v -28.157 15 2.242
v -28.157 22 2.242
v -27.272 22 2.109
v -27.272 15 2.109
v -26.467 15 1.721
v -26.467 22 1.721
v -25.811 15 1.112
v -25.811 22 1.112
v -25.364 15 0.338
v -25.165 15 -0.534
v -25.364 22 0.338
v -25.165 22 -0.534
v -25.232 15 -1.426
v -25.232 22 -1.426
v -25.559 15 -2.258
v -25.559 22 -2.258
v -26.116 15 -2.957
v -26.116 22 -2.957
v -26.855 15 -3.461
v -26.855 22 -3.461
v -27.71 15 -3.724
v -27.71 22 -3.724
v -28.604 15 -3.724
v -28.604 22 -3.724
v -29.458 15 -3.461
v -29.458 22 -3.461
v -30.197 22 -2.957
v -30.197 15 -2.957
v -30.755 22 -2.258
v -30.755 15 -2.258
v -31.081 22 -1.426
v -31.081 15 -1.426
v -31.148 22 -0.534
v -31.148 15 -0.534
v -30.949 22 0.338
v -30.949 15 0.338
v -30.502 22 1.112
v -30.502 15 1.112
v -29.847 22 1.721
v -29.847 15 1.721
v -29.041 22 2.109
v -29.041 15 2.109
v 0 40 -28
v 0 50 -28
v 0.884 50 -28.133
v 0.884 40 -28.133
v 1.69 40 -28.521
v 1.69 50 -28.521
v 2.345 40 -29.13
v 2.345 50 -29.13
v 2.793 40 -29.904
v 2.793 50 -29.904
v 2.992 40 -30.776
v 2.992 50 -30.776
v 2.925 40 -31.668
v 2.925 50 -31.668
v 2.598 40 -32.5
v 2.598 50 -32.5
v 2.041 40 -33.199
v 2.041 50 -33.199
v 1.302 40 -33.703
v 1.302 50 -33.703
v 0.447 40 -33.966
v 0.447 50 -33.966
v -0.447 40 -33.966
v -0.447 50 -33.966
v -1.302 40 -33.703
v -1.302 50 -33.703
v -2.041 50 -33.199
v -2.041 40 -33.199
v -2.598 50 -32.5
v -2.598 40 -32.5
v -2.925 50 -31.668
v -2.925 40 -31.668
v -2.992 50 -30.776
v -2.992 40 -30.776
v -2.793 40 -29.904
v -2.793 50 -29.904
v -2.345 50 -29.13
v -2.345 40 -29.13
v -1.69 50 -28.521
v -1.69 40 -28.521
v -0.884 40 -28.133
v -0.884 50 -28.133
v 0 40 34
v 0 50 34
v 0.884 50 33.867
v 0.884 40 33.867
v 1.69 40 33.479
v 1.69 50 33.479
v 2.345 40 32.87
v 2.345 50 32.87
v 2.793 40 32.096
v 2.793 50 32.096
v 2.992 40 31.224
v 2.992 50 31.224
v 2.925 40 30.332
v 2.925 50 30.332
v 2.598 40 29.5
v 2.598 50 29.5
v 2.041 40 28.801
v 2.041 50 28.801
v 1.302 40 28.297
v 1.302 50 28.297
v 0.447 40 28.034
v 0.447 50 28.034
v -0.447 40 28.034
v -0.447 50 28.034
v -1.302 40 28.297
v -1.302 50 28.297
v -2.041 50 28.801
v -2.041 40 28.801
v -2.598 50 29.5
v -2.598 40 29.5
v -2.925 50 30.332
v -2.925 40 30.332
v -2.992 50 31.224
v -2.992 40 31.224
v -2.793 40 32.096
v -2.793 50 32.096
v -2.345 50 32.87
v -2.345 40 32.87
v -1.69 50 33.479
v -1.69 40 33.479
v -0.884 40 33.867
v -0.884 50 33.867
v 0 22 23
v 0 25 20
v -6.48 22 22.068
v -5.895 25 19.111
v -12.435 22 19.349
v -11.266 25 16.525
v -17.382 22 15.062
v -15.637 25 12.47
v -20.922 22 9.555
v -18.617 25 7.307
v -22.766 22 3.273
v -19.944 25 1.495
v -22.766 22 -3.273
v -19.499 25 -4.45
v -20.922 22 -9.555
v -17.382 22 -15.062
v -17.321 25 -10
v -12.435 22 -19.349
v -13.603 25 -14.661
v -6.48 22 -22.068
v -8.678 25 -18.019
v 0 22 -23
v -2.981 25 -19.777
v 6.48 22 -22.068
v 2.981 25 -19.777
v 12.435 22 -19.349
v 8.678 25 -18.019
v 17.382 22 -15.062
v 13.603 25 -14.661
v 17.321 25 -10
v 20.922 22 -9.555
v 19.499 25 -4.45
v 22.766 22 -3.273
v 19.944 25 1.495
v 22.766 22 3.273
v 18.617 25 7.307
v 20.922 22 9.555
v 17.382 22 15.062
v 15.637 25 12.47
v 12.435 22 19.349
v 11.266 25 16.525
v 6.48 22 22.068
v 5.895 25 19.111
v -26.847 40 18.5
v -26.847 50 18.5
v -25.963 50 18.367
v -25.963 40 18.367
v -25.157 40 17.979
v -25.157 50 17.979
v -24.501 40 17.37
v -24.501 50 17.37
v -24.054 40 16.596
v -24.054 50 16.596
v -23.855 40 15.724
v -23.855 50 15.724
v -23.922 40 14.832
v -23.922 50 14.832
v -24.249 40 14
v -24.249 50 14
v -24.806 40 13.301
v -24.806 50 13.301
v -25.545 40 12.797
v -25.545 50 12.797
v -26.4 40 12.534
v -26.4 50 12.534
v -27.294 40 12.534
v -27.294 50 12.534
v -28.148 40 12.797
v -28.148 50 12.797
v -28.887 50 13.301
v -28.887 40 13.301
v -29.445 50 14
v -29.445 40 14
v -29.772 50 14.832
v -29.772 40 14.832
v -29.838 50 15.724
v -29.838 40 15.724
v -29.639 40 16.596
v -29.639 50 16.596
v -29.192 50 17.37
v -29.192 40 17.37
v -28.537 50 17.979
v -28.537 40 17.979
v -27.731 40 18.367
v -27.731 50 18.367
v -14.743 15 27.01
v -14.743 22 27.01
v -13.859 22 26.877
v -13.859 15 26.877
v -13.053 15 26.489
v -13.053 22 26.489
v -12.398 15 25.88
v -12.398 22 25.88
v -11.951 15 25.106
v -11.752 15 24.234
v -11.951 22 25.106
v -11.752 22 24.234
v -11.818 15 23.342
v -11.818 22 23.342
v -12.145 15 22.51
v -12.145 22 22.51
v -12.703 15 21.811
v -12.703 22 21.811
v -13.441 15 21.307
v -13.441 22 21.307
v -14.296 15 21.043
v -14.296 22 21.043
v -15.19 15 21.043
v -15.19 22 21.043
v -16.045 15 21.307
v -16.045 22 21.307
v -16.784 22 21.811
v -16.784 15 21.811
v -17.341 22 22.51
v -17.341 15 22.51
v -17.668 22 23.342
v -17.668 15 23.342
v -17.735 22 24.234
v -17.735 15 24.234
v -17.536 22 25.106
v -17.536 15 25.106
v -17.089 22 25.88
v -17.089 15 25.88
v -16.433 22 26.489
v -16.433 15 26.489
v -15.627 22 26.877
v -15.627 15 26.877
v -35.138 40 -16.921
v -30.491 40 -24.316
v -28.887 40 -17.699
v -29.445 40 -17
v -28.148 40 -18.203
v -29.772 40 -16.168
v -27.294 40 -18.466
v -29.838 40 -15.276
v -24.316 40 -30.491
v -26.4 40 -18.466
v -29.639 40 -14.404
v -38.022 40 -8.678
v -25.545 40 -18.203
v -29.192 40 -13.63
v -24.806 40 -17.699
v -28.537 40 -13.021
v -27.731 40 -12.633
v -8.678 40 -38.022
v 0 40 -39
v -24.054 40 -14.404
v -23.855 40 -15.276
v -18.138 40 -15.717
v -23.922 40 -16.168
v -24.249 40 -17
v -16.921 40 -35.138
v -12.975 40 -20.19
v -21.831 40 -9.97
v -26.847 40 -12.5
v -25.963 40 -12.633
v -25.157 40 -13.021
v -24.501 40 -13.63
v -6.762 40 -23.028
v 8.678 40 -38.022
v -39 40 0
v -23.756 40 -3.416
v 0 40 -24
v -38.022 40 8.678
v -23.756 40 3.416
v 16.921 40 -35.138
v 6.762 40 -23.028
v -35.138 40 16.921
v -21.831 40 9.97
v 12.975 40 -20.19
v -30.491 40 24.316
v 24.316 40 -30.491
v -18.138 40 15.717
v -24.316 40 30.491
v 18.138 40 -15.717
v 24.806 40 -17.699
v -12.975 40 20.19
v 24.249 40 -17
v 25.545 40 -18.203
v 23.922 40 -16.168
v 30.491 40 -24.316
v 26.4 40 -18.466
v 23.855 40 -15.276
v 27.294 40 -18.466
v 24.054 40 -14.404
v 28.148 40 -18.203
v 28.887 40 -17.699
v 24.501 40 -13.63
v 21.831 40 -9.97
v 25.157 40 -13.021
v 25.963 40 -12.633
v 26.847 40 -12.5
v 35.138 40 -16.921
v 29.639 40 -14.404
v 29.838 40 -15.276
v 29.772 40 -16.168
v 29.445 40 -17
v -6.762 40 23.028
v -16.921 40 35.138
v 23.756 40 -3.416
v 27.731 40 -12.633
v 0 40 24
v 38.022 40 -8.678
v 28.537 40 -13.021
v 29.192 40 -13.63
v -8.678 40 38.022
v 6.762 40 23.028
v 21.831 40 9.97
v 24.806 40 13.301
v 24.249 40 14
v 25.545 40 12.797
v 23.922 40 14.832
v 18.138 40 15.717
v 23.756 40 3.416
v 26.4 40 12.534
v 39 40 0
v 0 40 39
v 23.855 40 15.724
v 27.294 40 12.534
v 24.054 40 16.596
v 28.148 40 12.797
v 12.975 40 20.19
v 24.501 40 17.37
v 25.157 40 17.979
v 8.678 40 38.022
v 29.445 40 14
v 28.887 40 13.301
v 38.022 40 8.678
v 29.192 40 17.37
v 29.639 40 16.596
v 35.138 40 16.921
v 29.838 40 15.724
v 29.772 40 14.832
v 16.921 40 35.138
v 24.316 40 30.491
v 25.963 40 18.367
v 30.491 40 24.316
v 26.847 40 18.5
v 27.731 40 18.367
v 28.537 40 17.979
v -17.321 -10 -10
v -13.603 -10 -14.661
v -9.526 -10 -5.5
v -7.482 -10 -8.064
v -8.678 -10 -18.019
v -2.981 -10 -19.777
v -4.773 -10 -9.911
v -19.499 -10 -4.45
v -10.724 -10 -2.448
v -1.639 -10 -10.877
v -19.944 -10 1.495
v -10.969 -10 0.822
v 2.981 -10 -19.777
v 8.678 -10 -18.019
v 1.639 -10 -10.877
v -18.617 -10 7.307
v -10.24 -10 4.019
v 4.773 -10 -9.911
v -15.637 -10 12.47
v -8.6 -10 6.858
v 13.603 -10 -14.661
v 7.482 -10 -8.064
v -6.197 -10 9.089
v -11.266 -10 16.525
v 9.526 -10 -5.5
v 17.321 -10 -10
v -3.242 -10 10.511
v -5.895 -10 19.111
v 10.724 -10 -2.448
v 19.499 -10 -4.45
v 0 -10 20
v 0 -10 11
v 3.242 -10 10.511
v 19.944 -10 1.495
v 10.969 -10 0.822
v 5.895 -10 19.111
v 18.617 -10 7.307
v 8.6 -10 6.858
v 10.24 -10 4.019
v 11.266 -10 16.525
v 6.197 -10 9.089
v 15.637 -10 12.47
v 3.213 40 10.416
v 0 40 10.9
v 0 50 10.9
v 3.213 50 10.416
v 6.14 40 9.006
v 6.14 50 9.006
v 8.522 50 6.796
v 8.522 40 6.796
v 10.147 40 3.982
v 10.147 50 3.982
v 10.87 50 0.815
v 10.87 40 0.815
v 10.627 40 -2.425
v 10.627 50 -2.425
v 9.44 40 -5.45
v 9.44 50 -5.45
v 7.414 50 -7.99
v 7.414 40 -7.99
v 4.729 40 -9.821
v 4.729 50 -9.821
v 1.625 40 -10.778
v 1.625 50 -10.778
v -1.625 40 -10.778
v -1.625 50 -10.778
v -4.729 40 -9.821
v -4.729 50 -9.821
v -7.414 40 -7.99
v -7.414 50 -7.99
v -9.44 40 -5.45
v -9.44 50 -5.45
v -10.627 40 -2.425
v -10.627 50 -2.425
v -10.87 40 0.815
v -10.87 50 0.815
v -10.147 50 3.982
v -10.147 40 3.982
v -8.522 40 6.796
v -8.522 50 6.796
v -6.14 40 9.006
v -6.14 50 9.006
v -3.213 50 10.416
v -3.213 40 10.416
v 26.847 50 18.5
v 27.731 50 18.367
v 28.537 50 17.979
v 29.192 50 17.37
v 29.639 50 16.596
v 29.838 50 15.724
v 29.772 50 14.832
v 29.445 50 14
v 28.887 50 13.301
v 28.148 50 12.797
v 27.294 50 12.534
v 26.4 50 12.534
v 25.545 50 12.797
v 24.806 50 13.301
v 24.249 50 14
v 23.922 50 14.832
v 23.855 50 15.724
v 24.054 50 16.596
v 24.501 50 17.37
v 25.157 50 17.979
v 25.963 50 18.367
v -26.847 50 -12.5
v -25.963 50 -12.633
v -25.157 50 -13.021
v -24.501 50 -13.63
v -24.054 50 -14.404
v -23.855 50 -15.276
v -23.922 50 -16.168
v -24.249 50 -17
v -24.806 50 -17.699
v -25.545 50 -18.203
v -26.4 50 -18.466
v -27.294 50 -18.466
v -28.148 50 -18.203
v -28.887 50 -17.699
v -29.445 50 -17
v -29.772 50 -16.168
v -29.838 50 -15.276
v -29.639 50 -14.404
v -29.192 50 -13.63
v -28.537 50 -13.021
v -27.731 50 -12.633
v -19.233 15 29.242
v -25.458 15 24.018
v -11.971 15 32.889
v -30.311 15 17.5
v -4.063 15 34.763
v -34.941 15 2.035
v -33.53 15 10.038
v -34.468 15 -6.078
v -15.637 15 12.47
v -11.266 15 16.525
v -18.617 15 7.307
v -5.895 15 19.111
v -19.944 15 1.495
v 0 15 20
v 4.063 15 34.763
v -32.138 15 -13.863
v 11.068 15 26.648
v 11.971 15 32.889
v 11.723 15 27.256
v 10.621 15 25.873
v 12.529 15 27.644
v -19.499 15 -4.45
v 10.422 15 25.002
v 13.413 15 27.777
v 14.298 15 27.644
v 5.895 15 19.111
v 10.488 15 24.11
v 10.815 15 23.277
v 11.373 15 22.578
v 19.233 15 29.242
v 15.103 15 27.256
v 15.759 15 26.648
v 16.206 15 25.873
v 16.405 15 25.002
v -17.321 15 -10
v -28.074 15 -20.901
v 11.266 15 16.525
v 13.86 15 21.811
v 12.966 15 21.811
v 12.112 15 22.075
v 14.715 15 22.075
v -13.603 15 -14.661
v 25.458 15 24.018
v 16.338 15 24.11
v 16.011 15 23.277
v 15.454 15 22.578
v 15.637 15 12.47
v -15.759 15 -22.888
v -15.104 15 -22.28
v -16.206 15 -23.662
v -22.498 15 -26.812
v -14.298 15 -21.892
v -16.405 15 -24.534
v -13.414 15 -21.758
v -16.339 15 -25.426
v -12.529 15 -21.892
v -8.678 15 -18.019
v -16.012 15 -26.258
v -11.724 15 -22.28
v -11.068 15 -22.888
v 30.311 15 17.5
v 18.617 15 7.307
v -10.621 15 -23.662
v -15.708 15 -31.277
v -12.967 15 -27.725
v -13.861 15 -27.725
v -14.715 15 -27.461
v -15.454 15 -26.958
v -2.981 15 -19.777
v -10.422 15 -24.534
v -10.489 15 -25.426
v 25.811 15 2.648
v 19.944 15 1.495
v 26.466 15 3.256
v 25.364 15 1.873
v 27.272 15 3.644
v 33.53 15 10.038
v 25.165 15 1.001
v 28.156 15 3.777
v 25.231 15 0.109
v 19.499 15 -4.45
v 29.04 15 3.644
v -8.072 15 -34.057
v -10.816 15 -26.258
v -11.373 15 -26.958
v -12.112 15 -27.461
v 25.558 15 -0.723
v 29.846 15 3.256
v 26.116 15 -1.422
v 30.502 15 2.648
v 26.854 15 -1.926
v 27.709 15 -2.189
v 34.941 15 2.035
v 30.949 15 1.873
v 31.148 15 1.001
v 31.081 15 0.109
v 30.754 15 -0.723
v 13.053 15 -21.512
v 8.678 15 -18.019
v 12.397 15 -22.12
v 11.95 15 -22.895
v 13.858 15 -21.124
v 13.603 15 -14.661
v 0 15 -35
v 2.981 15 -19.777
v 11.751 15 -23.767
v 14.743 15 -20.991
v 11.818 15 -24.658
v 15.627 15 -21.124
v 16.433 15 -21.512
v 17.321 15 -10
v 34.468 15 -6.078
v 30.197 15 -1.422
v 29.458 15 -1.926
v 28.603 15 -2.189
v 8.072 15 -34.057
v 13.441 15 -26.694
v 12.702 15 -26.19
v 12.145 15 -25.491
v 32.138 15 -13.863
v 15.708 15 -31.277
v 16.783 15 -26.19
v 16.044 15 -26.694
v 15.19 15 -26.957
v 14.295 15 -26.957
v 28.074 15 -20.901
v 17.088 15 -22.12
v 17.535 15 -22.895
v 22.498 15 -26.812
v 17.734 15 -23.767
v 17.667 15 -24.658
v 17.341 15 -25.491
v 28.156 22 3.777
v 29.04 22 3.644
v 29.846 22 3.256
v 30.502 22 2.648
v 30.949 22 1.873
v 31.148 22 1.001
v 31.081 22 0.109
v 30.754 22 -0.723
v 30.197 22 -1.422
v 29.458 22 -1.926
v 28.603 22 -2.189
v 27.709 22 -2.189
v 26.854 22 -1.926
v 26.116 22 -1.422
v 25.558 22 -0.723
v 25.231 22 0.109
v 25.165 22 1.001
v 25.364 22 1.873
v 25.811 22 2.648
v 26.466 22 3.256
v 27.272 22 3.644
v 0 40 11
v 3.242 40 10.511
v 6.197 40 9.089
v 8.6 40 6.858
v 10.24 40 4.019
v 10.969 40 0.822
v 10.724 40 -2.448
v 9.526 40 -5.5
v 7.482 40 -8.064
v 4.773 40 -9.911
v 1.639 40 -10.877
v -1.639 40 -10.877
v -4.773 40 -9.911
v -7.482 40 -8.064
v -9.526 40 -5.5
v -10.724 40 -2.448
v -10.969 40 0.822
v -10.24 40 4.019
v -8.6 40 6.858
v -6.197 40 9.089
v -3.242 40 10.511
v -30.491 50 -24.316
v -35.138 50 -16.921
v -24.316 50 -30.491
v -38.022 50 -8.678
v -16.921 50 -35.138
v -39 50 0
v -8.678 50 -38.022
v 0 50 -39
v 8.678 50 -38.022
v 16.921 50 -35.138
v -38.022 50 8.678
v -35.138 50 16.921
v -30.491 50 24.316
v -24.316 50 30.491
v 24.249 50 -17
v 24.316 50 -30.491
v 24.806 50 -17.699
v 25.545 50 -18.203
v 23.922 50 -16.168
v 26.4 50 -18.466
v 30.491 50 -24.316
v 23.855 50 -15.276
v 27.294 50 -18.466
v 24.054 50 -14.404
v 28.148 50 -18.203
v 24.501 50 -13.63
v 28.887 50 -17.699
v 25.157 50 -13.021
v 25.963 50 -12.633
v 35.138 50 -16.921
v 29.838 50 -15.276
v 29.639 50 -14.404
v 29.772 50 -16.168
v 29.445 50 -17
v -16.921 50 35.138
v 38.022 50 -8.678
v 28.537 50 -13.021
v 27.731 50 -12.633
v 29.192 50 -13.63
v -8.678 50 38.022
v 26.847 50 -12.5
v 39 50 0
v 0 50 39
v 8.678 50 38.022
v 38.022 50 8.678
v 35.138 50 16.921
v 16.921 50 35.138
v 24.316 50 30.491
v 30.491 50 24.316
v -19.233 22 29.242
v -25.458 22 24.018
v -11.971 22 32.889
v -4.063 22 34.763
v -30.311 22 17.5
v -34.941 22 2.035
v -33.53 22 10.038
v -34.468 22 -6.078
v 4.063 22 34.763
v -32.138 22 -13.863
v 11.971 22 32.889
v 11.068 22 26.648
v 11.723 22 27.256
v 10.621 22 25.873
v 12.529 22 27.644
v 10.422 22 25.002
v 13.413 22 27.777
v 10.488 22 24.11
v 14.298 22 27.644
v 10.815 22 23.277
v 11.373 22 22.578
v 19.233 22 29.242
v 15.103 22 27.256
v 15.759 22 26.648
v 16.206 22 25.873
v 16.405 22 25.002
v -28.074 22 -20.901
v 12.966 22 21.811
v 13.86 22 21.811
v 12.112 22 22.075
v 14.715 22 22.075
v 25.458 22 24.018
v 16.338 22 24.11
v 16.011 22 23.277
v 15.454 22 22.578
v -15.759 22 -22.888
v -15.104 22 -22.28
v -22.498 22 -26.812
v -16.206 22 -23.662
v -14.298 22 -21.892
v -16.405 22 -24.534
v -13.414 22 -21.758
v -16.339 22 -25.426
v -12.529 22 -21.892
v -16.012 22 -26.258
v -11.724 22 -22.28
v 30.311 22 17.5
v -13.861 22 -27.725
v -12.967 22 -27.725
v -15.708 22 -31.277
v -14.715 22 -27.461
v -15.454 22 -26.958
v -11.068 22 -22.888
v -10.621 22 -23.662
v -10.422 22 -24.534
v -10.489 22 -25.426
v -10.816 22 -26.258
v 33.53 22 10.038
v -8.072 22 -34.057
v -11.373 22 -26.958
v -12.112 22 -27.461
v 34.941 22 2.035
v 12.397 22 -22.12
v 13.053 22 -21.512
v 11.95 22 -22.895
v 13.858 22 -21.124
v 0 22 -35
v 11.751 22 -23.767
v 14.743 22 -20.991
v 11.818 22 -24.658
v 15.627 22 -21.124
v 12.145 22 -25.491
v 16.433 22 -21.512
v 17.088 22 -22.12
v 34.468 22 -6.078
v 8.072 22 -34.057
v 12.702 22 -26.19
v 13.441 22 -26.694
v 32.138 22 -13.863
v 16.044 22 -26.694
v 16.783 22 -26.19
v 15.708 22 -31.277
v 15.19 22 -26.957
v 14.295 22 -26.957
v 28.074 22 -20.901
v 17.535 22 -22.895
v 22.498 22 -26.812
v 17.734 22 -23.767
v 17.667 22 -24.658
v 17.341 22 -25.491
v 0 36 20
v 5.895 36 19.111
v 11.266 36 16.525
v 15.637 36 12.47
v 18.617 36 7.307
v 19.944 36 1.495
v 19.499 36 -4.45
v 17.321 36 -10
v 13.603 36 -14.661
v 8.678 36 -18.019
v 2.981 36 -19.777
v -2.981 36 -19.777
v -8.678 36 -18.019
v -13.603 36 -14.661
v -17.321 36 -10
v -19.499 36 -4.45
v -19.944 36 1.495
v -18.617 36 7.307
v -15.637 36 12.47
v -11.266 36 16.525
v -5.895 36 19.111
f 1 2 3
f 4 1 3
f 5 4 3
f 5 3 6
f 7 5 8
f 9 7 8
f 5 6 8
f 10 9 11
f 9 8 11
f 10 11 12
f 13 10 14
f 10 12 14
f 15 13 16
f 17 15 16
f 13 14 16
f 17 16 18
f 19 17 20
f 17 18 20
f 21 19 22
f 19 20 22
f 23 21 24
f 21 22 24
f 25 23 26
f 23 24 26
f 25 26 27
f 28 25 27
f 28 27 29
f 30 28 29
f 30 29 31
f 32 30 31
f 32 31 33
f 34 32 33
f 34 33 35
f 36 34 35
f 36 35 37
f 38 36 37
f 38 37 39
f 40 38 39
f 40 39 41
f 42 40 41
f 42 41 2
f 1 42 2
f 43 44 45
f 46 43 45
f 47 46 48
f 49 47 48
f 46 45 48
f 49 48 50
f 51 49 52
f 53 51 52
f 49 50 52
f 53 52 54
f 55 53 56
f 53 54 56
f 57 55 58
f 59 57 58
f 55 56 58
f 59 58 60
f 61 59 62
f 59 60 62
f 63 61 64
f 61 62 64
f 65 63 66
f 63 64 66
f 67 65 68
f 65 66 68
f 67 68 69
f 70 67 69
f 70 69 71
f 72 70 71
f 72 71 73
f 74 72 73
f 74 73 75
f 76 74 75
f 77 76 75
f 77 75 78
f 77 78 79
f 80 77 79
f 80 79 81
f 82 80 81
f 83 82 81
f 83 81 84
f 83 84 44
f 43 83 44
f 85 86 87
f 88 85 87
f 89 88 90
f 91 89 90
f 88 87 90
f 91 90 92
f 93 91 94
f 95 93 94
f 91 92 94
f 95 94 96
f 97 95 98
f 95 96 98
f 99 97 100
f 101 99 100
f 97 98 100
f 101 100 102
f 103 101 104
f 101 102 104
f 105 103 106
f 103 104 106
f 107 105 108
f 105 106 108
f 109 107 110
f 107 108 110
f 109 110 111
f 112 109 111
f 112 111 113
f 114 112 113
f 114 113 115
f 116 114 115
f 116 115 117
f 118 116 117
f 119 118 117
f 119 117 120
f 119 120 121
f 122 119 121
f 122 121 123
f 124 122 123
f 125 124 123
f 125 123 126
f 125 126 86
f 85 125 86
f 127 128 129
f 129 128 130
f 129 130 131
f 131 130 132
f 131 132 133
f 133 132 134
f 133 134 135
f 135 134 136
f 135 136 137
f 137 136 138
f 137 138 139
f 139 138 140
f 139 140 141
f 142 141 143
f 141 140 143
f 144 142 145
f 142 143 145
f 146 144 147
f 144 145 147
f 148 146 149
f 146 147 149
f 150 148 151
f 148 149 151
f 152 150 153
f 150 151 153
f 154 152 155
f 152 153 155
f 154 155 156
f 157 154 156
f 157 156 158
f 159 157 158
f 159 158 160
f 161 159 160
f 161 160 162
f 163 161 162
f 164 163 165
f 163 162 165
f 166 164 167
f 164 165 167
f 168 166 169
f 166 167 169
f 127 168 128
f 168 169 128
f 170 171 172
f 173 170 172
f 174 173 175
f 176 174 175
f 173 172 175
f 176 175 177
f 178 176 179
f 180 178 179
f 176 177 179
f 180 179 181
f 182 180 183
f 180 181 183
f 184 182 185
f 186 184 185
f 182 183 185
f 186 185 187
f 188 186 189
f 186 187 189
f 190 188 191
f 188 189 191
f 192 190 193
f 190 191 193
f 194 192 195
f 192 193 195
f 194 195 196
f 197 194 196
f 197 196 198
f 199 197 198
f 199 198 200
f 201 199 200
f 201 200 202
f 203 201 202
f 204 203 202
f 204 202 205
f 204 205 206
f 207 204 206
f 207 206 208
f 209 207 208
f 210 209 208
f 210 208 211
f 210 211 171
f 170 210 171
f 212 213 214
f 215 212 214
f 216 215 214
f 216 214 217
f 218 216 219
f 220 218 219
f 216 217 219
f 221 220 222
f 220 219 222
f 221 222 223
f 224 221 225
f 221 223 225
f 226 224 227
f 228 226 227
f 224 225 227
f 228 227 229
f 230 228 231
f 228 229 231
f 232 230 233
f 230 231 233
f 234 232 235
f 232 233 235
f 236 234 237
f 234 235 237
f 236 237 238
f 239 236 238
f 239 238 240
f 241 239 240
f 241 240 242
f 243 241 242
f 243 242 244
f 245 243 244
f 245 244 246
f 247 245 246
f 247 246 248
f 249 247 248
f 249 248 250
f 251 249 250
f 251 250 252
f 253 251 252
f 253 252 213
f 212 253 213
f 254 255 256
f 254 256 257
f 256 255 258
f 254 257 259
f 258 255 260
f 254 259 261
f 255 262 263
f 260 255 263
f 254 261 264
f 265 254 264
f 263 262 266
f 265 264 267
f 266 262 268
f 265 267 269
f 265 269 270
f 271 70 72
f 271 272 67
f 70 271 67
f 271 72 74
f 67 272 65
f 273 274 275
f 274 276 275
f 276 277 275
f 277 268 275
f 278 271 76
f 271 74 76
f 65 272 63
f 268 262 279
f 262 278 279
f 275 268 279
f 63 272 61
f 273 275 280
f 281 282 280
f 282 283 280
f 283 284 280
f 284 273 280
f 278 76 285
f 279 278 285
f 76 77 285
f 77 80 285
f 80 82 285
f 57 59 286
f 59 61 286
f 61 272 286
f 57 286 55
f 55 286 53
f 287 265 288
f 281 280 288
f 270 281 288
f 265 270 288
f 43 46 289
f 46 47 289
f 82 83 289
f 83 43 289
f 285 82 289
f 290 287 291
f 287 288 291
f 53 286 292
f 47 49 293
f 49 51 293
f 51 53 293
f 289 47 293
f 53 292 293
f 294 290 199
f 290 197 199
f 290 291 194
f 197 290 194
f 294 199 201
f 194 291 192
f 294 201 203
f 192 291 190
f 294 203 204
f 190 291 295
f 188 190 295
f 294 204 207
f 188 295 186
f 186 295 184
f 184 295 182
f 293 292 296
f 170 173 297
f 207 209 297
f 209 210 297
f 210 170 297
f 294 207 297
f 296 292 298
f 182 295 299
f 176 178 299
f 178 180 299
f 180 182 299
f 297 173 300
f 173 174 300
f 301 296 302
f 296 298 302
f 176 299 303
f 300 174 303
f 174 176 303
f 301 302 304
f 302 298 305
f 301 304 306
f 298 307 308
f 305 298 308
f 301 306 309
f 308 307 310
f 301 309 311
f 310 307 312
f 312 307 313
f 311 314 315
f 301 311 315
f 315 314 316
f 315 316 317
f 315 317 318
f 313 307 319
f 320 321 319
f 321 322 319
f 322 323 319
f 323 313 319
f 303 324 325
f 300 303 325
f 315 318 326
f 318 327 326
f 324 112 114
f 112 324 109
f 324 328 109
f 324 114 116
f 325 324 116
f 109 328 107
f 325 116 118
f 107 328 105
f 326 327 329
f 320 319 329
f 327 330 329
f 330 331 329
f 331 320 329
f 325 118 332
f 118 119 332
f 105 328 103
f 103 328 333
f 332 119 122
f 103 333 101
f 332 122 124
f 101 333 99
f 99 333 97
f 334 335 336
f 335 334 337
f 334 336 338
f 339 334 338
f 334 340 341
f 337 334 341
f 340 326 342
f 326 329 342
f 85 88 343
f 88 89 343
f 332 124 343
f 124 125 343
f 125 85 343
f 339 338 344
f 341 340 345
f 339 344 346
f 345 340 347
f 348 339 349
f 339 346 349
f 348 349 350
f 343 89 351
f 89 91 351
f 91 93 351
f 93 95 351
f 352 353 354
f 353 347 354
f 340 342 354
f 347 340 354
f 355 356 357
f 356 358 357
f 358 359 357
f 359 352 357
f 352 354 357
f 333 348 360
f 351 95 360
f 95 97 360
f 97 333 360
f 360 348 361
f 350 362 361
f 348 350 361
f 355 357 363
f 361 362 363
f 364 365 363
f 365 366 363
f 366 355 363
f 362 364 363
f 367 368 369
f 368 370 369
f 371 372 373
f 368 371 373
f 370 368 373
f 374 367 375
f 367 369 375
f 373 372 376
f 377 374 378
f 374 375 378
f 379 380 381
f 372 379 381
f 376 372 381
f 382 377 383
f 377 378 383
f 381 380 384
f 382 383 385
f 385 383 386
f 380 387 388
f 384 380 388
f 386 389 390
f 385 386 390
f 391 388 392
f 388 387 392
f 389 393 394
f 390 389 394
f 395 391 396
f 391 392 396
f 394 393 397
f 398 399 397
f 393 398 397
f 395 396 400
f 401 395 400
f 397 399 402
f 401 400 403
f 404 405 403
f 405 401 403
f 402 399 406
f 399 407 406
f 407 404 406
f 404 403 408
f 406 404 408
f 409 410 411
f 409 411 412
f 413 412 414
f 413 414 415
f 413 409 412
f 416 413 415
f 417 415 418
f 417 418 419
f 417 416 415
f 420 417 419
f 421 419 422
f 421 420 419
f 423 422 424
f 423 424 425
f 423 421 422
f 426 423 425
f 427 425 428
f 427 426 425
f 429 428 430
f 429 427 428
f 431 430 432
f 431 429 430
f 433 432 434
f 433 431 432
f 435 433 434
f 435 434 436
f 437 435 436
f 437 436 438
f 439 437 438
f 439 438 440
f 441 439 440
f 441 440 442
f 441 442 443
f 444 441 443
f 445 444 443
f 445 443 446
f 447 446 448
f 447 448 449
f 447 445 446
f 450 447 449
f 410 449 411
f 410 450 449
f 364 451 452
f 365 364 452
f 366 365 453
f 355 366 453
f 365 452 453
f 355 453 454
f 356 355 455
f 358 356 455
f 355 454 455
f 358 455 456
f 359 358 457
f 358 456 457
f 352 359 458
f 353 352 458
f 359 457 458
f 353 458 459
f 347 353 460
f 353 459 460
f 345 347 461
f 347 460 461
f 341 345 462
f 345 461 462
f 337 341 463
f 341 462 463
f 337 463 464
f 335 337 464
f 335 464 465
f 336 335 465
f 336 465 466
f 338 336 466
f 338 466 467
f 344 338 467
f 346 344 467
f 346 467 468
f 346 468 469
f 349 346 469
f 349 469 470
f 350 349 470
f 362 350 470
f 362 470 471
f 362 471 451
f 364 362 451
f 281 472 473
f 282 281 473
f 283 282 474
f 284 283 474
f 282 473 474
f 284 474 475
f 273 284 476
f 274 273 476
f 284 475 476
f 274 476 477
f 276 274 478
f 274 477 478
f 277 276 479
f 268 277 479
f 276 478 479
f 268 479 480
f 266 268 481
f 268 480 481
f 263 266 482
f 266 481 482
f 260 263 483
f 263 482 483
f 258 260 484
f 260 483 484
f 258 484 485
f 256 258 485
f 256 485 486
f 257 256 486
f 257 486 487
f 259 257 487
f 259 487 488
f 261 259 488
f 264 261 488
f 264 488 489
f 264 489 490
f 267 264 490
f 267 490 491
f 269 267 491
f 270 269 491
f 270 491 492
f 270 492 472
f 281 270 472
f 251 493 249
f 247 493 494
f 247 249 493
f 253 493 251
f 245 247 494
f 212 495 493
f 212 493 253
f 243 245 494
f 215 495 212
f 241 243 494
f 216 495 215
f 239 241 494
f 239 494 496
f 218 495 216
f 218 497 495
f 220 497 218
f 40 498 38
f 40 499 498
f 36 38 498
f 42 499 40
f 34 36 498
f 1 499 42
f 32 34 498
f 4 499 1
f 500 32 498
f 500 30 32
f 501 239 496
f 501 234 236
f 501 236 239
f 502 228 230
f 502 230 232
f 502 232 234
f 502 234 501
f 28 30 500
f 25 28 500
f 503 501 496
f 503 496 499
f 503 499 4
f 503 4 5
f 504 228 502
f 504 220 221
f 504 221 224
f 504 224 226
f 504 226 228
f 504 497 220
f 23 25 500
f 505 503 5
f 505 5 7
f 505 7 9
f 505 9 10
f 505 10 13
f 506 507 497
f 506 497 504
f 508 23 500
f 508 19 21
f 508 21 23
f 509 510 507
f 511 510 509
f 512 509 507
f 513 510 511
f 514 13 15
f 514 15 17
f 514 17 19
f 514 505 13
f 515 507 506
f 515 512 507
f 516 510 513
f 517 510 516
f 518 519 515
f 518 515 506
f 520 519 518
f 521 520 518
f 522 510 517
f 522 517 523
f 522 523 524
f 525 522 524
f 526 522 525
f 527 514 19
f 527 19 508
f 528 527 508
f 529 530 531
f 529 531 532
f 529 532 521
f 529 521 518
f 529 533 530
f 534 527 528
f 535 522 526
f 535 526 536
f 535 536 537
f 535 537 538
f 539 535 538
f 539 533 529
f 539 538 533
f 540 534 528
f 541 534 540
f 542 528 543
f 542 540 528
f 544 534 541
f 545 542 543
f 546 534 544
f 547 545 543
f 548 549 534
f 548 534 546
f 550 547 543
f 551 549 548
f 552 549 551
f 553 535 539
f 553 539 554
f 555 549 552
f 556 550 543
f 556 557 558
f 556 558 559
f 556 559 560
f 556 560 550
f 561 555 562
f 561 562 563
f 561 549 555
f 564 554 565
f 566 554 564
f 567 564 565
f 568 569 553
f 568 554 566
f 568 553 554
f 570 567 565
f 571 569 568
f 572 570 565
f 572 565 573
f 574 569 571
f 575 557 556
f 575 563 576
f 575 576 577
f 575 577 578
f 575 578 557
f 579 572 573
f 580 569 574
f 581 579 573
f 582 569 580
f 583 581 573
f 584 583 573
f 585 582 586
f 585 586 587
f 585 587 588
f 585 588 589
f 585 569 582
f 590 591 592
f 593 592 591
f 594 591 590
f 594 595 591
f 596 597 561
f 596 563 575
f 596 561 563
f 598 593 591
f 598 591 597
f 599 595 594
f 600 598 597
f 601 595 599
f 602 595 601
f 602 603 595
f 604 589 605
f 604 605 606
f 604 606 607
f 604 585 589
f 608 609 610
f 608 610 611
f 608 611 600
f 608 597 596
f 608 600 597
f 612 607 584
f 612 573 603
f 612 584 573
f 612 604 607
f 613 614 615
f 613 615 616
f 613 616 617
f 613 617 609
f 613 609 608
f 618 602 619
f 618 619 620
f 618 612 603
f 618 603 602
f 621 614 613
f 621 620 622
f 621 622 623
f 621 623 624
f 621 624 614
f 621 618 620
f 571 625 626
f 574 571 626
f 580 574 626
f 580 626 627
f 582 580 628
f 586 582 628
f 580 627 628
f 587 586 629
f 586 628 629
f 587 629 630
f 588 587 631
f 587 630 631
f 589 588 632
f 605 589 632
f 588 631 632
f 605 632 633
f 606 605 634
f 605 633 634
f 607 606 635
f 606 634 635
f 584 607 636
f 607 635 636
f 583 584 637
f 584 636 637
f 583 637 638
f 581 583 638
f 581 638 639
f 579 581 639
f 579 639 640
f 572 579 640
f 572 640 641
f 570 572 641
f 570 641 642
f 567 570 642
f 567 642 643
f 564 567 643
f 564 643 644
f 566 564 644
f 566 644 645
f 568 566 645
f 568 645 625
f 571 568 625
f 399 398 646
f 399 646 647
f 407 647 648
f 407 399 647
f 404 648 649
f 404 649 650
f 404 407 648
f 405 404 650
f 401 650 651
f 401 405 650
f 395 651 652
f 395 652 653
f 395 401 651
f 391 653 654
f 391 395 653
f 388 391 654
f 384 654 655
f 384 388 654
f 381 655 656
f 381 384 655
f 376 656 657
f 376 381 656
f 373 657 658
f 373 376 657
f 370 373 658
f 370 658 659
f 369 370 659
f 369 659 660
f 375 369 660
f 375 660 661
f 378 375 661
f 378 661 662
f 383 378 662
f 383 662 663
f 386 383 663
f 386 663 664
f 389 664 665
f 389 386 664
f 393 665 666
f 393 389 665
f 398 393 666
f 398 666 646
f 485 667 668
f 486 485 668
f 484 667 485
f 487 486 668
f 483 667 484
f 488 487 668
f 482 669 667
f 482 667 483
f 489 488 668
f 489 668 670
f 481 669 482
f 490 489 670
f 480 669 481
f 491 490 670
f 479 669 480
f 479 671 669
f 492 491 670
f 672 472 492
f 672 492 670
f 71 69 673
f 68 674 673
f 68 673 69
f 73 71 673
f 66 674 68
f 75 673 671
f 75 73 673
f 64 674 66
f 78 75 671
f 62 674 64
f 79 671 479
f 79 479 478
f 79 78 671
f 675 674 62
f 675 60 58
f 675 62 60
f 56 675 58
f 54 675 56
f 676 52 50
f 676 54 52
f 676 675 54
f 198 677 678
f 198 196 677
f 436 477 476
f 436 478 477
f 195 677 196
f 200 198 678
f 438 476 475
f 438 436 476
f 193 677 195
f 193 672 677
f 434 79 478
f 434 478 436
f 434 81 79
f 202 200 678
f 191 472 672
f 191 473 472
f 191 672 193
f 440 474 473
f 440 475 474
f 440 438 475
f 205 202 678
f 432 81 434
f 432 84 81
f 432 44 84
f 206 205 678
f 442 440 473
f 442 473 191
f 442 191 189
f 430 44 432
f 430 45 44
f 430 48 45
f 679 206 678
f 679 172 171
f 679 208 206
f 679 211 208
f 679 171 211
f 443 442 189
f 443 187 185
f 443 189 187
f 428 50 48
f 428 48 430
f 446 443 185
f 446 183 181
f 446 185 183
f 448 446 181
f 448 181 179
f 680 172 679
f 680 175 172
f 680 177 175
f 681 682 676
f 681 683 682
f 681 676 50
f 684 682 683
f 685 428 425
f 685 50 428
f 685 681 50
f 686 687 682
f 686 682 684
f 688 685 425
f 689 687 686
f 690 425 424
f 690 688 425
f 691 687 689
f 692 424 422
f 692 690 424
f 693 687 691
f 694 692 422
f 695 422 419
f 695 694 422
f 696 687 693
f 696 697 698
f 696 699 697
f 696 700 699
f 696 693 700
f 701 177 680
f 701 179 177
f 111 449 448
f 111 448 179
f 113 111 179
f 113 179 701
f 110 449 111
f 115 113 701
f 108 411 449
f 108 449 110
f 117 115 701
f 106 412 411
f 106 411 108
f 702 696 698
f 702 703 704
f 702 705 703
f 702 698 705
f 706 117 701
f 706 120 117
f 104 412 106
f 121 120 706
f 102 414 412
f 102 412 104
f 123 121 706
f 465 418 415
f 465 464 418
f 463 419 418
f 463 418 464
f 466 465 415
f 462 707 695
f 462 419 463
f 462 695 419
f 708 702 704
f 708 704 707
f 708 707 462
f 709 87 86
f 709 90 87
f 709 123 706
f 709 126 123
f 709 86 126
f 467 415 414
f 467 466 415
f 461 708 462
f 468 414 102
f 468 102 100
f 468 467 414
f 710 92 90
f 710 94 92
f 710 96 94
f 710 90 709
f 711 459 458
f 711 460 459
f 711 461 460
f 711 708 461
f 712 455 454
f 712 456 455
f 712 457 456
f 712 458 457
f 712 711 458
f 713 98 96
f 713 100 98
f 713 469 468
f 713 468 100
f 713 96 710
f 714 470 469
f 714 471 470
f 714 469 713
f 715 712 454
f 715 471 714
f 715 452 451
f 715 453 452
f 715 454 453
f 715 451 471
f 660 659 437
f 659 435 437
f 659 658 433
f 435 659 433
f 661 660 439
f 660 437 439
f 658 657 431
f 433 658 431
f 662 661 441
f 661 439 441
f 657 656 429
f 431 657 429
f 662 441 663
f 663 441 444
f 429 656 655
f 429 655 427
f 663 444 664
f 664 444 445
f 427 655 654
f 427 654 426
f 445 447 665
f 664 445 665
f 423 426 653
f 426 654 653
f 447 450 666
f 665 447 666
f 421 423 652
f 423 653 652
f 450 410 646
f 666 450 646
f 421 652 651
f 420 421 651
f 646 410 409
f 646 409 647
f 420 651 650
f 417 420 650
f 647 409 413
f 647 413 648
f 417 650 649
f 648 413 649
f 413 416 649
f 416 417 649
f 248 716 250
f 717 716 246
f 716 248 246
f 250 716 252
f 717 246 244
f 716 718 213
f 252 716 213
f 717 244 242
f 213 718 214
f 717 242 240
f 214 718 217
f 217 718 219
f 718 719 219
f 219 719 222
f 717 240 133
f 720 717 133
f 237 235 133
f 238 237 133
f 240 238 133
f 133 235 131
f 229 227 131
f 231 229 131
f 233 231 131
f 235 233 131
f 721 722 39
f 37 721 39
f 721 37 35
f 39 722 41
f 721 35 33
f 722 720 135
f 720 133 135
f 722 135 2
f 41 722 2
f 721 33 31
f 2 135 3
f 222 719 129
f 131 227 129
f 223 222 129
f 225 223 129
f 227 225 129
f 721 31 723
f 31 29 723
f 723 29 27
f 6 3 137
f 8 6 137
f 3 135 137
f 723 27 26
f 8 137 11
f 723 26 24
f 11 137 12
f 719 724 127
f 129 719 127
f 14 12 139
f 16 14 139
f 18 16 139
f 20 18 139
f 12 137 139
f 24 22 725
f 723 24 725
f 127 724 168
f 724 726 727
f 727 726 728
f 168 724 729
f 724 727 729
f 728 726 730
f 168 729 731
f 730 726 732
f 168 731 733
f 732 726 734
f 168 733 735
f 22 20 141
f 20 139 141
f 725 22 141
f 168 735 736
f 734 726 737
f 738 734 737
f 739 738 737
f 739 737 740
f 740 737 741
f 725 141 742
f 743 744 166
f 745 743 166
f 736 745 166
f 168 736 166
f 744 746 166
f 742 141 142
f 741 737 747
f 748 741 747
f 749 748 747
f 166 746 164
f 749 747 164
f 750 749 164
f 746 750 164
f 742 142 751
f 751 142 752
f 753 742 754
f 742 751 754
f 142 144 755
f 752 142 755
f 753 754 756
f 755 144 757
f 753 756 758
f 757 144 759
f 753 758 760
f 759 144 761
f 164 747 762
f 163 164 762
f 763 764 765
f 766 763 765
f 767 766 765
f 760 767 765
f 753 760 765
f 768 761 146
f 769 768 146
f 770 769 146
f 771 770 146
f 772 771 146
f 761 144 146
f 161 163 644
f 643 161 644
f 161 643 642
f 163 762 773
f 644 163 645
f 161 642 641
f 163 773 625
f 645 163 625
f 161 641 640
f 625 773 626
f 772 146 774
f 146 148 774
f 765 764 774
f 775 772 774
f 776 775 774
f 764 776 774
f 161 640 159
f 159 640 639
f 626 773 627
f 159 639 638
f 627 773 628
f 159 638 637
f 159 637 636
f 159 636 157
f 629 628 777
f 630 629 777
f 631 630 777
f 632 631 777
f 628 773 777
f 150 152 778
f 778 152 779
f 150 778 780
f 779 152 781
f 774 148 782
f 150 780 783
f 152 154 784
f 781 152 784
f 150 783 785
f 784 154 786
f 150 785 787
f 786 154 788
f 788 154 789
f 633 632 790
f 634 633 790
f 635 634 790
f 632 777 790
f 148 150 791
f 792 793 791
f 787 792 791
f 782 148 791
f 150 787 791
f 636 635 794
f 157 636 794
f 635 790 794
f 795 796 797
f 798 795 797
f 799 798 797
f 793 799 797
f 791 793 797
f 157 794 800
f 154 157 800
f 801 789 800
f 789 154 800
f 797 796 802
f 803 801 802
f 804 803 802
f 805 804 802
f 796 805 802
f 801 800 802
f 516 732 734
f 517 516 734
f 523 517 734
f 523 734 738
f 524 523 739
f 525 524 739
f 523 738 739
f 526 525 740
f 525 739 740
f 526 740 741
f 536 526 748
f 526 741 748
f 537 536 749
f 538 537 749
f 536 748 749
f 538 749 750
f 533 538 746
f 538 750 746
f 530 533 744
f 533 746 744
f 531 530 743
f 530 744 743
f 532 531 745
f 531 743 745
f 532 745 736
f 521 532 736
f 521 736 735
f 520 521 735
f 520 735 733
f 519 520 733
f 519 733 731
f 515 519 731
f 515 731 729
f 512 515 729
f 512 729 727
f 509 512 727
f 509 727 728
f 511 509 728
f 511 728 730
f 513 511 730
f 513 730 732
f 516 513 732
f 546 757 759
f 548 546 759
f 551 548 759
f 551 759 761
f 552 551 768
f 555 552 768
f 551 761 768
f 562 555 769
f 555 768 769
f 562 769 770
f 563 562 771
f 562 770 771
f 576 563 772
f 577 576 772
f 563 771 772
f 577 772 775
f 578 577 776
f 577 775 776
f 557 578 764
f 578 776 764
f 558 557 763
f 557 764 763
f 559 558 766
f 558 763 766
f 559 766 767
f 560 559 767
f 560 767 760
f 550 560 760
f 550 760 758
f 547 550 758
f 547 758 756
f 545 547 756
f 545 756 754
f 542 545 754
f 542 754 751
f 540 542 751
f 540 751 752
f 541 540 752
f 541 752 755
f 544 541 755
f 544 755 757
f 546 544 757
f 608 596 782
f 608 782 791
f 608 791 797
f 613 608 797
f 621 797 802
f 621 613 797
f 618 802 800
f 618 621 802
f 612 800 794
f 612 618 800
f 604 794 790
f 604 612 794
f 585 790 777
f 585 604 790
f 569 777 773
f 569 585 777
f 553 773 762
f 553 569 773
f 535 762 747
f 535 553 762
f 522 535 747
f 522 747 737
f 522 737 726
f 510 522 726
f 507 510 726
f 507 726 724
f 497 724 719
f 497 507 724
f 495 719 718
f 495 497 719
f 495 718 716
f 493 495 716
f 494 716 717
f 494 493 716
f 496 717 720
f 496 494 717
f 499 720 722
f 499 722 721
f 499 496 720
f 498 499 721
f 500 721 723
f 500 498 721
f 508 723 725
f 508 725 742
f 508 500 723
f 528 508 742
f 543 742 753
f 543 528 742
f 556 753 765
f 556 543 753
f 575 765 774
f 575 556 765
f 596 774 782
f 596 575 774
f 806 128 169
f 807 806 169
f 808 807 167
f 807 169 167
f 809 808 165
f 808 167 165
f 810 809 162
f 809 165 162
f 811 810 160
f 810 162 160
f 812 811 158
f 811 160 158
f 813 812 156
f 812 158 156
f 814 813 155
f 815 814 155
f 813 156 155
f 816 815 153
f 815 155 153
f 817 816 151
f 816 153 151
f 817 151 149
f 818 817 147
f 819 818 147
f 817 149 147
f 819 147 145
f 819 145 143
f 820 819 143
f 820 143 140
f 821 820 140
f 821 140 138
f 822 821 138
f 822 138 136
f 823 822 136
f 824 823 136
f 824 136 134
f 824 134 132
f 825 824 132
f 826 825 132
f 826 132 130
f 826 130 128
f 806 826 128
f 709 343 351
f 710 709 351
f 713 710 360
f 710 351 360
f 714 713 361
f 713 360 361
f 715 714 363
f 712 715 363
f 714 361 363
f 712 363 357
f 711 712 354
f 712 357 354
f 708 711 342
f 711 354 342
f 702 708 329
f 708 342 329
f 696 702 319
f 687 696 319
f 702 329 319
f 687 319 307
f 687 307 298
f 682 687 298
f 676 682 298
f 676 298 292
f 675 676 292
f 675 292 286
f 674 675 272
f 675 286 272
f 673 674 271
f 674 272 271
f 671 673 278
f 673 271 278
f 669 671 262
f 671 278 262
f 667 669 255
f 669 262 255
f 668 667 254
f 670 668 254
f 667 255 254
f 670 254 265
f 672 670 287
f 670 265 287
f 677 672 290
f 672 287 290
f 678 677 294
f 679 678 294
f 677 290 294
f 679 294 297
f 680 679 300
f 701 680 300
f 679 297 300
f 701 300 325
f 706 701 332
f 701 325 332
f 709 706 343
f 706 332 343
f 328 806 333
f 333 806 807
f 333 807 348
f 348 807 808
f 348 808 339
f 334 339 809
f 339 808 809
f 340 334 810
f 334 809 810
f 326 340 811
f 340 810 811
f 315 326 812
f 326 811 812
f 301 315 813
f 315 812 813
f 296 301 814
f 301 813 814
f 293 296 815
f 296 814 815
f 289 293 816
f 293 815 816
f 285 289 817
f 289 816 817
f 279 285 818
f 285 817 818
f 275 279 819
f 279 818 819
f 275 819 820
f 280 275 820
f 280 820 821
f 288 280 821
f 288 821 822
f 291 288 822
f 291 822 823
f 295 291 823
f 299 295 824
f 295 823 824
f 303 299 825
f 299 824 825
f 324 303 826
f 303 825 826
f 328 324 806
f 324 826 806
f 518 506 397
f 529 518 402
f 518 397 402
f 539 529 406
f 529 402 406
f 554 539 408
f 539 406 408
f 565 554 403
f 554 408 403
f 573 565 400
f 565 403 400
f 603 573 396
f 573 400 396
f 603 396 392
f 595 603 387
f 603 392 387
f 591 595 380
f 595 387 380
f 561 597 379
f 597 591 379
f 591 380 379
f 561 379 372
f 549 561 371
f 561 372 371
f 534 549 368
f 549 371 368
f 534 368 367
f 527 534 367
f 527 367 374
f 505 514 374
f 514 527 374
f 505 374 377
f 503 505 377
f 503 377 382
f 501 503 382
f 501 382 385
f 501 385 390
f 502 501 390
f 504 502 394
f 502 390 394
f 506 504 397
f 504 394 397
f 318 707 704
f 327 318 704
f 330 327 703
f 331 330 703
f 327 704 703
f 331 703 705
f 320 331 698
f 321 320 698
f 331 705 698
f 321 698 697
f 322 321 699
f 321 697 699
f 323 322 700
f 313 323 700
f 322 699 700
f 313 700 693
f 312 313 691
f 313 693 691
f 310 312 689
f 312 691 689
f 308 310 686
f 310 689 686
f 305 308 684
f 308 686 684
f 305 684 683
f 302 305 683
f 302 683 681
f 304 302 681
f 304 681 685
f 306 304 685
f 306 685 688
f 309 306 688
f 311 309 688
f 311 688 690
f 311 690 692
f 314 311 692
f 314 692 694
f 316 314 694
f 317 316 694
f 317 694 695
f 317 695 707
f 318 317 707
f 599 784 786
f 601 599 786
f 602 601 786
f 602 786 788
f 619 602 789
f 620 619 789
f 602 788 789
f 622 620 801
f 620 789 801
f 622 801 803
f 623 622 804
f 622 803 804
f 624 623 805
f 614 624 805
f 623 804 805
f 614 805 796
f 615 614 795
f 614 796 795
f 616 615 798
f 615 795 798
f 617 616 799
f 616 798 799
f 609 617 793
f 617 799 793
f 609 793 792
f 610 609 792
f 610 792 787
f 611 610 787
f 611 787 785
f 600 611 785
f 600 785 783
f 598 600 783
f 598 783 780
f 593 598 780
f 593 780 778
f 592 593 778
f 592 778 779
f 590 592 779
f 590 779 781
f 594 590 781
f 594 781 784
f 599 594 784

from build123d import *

# Parameters (mm, degrees)
EXTRUDE_START       = -10
SKETCH_1_R          = 20
SKETCH_1_R_2        = 11
EXTRUDE_1_DEPTH     = 50
SKETCH_2_R          = 39
SKETCH_2_R_2        = 10.9
EXTRUDE_2_DEPTH     = 10
CHAMFER_1_SIZE      = 4
SKETCH_3_R          = 35
SKETCH_3_R_2        = 17
EXTRUDE_3_DEPTH     = 7
CHAMFER_2_SIZE      = 3
SKETCH_4_R          = 3.000000009
CUT_EXTRUDE_1_DEPTH = 64.765194268
CUT_EXTRUDE_4_REACH = 83.498
SKETCH_5_R          = 3


with BuildPart() as part:
    # Эскиз1 → Вытянуть1 (new body)
    with BuildSketch(Plane(origin=(0, 0, 0), x_dir=(1, 0, 0), z_dir=(0, 1, 0)).offset(EXTRUDE_START)):
        with Locations(Location((0, 0, 0), (0, 0, 270))):
            Circle(SKETCH_1_R)
        with Locations(Location((0, 0, 0), (0, 0, 270))):
            Circle(SKETCH_1_R_2, mode=Mode.SUBTRACT)
    extrude(amount=EXTRUDE_1_DEPTH)

    # Эскиз2 → Вытянуть2 (add)
    with BuildSketch(Plane(origin=(0, 40, 0), x_dir=(1, 0, 0), z_dir=(0, 1, 0))):
        with Locations(Location((0, 0, 0), (0, 0, 270))):
            Circle(SKETCH_2_R)
        with Locations(Location((0, 0, 0), (0, 0, 270))):
            Circle(SKETCH_2_R_2, mode=Mode.SUBTRACT)
    extrude(amount=EXTRUDE_2_DEPTH)

    # Фаска1
    chamfer_1_edges = [part.edges().sort_by_distance(p)[0] for p in [
        (0, 40, -20),
    ]]
    chamfer(chamfer_1_edges, length=CHAMFER_1_SIZE)

    # Эскиз3 → Вытянуть3 (add)
    with BuildSketch(Plane.XZ.offset(-15)):
        with Locations(Location((0, 0, 0), (0, 0, 270))):
            Circle(SKETCH_3_R)
        Circle(SKETCH_3_R_2, mode=Mode.SUBTRACT)
    extrude(amount=-EXTRUDE_3_DEPTH)

    # Фаска2
    chamfer_2_edges = [part.edges().sort_by_distance(p)[0] for p in [
        (0, 22, -20),
    ]]
    chamfer(chamfer_2_edges, length=CHAMFER_2_SIZE)

    # Эскиз4 → Вырез-Вытянуть1 (cut, through all)
    with BuildSketch(Plane(origin=(0, 22, 0), x_dir=(1, 0, 0), z_dir=(0, 1, 0))):
        with Locations(Location((-13.413764566, 24.758384407, 0), (0, 0, 270))):
            Circle(SKETCH_4_R)
        with Locations(Location((14.742626006, 23.99086611, 0), (0, 0, 270))):
            Circle(SKETCH_4_R)
        with Locations(Location((28.156130949, -0.777042552, 0), (0, 0, 270))):
            Circle(SKETCH_4_R)
        with Locations(Location((13.41324532, -24.777432917, 0), (0, 0, 270))):
            Circle(SKETCH_4_R)
        with Locations(Location((-14.743145251, -24.009914621, 0), (0, 0, 270))):
            Circle(SKETCH_4_R)
        with Locations(Location((-28.156650194, 0.757994041, 0), (0, 0, 270))):
            Circle(SKETCH_4_R)
    extrude(amount=-CUT_EXTRUDE_1_DEPTH, mode=Mode.SUBTRACT)

    # Эскиз5 → Вытянуть4 (cut, up to next)
    with BuildSketch(Plane(origin=(0, 50, 0), x_dir=(1, 0, 0), z_dir=(0, 1, 0)), mode=Mode.PRIVATE) as cut_extrude_4_sk1:
        with Locations(Location((0, 31, 0), (0, 0, 270))):
            Circle(SKETCH_5_R)
    cut_extrude_4_tool1 = extrude(cut_extrude_4_sk1.sketch, amount=-CUT_EXTRUDE_4_REACH, mode=Mode.PRIVATE) & part.part
    # Эскиз5 → Вытянуть4 (cut, up to next)
    with BuildSketch(Plane(origin=(0, 50, 0), x_dir=(1, 0, 0), z_dir=(0, 1, 0)), mode=Mode.PRIVATE) as cut_extrude_4_sk2:
        with Locations(Location((26.846787517, 15.5, 0), (0, 0, 270))):
            Circle(SKETCH_5_R)
    cut_extrude_4_tool2 = extrude(cut_extrude_4_sk2.sketch, amount=-CUT_EXTRUDE_4_REACH, mode=Mode.PRIVATE) & part.part
    # Эскиз5 → Вытянуть4 (cut, up to next)
    with BuildSketch(Plane(origin=(0, 50, 0), x_dir=(1, 0, 0), z_dir=(0, 1, 0)), mode=Mode.PRIVATE) as cut_extrude_4_sk3:
        with Locations(Location((26.846787517, -15.5, 0), (0, 0, 270))):
            Circle(SKETCH_5_R)
    cut_extrude_4_tool3 = extrude(cut_extrude_4_sk3.sketch, amount=-CUT_EXTRUDE_4_REACH, mode=Mode.PRIVATE) & part.part
    # Эскиз5 → Вытянуть4 (cut, up to next)
    with BuildSketch(Plane(origin=(0, 50, 0), x_dir=(1, 0, 0), z_dir=(0, 1, 0)), mode=Mode.PRIVATE) as cut_extrude_4_sk4:
        with Locations(Location((0, -31, 0), (0, 0, 270))):
            Circle(SKETCH_5_R)
    cut_extrude_4_tool4 = extrude(cut_extrude_4_sk4.sketch, amount=-CUT_EXTRUDE_4_REACH, mode=Mode.PRIVATE) & part.part
    # Эскиз5 → Вытянуть4 (cut, up to next)
    with BuildSketch(Plane(origin=(0, 50, 0), x_dir=(1, 0, 0), z_dir=(0, 1, 0)), mode=Mode.PRIVATE) as cut_extrude_4_sk5:
        with Locations(Location((-26.846787517, -15.5, 0), (0, 0, 270))):
            Circle(SKETCH_5_R)
    cut_extrude_4_tool5 = extrude(cut_extrude_4_sk5.sketch, amount=-CUT_EXTRUDE_4_REACH, mode=Mode.PRIVATE) & part.part
    # Эскиз5 → Вытянуть4 (cut, up to next)
    with BuildSketch(Plane(origin=(0, 50, 0), x_dir=(1, 0, 0), z_dir=(0, 1, 0)), mode=Mode.PRIVATE) as cut_extrude_4_sk6:
        with Locations(Location((-26.846787517, 15.5, 0), (0, 0, 270))):
            Circle(SKETCH_5_R)
    cut_extrude_4_tool6 = extrude(cut_extrude_4_sk6.sketch, amount=-CUT_EXTRUDE_4_REACH, mode=Mode.PRIVATE) & part.part
    add(cut_extrude_4_tool1.solids().sort_by_distance((0, 50, -31))[0], mode=Mode.SUBTRACT)
    add(cut_extrude_4_tool2.solids().sort_by_distance((26.846788, 50, -15.5))[0], mode=Mode.SUBTRACT)
    add(cut_extrude_4_tool3.solids().sort_by_distance((26.846788, 50, 15.5))[0], mode=Mode.SUBTRACT)
    add(cut_extrude_4_tool4.solids().sort_by_distance((0, 50, 31))[0], mode=Mode.SUBTRACT)
    add(cut_extrude_4_tool5.solids().sort_by_distance((-26.846788, 50, 15.5))[0], mode=Mode.SUBTRACT)
    add(cut_extrude_4_tool6.solids().sort_by_distance((-26.846788, 50, -15.5))[0], mode=Mode.SUBTRACT)


solid = part.part
